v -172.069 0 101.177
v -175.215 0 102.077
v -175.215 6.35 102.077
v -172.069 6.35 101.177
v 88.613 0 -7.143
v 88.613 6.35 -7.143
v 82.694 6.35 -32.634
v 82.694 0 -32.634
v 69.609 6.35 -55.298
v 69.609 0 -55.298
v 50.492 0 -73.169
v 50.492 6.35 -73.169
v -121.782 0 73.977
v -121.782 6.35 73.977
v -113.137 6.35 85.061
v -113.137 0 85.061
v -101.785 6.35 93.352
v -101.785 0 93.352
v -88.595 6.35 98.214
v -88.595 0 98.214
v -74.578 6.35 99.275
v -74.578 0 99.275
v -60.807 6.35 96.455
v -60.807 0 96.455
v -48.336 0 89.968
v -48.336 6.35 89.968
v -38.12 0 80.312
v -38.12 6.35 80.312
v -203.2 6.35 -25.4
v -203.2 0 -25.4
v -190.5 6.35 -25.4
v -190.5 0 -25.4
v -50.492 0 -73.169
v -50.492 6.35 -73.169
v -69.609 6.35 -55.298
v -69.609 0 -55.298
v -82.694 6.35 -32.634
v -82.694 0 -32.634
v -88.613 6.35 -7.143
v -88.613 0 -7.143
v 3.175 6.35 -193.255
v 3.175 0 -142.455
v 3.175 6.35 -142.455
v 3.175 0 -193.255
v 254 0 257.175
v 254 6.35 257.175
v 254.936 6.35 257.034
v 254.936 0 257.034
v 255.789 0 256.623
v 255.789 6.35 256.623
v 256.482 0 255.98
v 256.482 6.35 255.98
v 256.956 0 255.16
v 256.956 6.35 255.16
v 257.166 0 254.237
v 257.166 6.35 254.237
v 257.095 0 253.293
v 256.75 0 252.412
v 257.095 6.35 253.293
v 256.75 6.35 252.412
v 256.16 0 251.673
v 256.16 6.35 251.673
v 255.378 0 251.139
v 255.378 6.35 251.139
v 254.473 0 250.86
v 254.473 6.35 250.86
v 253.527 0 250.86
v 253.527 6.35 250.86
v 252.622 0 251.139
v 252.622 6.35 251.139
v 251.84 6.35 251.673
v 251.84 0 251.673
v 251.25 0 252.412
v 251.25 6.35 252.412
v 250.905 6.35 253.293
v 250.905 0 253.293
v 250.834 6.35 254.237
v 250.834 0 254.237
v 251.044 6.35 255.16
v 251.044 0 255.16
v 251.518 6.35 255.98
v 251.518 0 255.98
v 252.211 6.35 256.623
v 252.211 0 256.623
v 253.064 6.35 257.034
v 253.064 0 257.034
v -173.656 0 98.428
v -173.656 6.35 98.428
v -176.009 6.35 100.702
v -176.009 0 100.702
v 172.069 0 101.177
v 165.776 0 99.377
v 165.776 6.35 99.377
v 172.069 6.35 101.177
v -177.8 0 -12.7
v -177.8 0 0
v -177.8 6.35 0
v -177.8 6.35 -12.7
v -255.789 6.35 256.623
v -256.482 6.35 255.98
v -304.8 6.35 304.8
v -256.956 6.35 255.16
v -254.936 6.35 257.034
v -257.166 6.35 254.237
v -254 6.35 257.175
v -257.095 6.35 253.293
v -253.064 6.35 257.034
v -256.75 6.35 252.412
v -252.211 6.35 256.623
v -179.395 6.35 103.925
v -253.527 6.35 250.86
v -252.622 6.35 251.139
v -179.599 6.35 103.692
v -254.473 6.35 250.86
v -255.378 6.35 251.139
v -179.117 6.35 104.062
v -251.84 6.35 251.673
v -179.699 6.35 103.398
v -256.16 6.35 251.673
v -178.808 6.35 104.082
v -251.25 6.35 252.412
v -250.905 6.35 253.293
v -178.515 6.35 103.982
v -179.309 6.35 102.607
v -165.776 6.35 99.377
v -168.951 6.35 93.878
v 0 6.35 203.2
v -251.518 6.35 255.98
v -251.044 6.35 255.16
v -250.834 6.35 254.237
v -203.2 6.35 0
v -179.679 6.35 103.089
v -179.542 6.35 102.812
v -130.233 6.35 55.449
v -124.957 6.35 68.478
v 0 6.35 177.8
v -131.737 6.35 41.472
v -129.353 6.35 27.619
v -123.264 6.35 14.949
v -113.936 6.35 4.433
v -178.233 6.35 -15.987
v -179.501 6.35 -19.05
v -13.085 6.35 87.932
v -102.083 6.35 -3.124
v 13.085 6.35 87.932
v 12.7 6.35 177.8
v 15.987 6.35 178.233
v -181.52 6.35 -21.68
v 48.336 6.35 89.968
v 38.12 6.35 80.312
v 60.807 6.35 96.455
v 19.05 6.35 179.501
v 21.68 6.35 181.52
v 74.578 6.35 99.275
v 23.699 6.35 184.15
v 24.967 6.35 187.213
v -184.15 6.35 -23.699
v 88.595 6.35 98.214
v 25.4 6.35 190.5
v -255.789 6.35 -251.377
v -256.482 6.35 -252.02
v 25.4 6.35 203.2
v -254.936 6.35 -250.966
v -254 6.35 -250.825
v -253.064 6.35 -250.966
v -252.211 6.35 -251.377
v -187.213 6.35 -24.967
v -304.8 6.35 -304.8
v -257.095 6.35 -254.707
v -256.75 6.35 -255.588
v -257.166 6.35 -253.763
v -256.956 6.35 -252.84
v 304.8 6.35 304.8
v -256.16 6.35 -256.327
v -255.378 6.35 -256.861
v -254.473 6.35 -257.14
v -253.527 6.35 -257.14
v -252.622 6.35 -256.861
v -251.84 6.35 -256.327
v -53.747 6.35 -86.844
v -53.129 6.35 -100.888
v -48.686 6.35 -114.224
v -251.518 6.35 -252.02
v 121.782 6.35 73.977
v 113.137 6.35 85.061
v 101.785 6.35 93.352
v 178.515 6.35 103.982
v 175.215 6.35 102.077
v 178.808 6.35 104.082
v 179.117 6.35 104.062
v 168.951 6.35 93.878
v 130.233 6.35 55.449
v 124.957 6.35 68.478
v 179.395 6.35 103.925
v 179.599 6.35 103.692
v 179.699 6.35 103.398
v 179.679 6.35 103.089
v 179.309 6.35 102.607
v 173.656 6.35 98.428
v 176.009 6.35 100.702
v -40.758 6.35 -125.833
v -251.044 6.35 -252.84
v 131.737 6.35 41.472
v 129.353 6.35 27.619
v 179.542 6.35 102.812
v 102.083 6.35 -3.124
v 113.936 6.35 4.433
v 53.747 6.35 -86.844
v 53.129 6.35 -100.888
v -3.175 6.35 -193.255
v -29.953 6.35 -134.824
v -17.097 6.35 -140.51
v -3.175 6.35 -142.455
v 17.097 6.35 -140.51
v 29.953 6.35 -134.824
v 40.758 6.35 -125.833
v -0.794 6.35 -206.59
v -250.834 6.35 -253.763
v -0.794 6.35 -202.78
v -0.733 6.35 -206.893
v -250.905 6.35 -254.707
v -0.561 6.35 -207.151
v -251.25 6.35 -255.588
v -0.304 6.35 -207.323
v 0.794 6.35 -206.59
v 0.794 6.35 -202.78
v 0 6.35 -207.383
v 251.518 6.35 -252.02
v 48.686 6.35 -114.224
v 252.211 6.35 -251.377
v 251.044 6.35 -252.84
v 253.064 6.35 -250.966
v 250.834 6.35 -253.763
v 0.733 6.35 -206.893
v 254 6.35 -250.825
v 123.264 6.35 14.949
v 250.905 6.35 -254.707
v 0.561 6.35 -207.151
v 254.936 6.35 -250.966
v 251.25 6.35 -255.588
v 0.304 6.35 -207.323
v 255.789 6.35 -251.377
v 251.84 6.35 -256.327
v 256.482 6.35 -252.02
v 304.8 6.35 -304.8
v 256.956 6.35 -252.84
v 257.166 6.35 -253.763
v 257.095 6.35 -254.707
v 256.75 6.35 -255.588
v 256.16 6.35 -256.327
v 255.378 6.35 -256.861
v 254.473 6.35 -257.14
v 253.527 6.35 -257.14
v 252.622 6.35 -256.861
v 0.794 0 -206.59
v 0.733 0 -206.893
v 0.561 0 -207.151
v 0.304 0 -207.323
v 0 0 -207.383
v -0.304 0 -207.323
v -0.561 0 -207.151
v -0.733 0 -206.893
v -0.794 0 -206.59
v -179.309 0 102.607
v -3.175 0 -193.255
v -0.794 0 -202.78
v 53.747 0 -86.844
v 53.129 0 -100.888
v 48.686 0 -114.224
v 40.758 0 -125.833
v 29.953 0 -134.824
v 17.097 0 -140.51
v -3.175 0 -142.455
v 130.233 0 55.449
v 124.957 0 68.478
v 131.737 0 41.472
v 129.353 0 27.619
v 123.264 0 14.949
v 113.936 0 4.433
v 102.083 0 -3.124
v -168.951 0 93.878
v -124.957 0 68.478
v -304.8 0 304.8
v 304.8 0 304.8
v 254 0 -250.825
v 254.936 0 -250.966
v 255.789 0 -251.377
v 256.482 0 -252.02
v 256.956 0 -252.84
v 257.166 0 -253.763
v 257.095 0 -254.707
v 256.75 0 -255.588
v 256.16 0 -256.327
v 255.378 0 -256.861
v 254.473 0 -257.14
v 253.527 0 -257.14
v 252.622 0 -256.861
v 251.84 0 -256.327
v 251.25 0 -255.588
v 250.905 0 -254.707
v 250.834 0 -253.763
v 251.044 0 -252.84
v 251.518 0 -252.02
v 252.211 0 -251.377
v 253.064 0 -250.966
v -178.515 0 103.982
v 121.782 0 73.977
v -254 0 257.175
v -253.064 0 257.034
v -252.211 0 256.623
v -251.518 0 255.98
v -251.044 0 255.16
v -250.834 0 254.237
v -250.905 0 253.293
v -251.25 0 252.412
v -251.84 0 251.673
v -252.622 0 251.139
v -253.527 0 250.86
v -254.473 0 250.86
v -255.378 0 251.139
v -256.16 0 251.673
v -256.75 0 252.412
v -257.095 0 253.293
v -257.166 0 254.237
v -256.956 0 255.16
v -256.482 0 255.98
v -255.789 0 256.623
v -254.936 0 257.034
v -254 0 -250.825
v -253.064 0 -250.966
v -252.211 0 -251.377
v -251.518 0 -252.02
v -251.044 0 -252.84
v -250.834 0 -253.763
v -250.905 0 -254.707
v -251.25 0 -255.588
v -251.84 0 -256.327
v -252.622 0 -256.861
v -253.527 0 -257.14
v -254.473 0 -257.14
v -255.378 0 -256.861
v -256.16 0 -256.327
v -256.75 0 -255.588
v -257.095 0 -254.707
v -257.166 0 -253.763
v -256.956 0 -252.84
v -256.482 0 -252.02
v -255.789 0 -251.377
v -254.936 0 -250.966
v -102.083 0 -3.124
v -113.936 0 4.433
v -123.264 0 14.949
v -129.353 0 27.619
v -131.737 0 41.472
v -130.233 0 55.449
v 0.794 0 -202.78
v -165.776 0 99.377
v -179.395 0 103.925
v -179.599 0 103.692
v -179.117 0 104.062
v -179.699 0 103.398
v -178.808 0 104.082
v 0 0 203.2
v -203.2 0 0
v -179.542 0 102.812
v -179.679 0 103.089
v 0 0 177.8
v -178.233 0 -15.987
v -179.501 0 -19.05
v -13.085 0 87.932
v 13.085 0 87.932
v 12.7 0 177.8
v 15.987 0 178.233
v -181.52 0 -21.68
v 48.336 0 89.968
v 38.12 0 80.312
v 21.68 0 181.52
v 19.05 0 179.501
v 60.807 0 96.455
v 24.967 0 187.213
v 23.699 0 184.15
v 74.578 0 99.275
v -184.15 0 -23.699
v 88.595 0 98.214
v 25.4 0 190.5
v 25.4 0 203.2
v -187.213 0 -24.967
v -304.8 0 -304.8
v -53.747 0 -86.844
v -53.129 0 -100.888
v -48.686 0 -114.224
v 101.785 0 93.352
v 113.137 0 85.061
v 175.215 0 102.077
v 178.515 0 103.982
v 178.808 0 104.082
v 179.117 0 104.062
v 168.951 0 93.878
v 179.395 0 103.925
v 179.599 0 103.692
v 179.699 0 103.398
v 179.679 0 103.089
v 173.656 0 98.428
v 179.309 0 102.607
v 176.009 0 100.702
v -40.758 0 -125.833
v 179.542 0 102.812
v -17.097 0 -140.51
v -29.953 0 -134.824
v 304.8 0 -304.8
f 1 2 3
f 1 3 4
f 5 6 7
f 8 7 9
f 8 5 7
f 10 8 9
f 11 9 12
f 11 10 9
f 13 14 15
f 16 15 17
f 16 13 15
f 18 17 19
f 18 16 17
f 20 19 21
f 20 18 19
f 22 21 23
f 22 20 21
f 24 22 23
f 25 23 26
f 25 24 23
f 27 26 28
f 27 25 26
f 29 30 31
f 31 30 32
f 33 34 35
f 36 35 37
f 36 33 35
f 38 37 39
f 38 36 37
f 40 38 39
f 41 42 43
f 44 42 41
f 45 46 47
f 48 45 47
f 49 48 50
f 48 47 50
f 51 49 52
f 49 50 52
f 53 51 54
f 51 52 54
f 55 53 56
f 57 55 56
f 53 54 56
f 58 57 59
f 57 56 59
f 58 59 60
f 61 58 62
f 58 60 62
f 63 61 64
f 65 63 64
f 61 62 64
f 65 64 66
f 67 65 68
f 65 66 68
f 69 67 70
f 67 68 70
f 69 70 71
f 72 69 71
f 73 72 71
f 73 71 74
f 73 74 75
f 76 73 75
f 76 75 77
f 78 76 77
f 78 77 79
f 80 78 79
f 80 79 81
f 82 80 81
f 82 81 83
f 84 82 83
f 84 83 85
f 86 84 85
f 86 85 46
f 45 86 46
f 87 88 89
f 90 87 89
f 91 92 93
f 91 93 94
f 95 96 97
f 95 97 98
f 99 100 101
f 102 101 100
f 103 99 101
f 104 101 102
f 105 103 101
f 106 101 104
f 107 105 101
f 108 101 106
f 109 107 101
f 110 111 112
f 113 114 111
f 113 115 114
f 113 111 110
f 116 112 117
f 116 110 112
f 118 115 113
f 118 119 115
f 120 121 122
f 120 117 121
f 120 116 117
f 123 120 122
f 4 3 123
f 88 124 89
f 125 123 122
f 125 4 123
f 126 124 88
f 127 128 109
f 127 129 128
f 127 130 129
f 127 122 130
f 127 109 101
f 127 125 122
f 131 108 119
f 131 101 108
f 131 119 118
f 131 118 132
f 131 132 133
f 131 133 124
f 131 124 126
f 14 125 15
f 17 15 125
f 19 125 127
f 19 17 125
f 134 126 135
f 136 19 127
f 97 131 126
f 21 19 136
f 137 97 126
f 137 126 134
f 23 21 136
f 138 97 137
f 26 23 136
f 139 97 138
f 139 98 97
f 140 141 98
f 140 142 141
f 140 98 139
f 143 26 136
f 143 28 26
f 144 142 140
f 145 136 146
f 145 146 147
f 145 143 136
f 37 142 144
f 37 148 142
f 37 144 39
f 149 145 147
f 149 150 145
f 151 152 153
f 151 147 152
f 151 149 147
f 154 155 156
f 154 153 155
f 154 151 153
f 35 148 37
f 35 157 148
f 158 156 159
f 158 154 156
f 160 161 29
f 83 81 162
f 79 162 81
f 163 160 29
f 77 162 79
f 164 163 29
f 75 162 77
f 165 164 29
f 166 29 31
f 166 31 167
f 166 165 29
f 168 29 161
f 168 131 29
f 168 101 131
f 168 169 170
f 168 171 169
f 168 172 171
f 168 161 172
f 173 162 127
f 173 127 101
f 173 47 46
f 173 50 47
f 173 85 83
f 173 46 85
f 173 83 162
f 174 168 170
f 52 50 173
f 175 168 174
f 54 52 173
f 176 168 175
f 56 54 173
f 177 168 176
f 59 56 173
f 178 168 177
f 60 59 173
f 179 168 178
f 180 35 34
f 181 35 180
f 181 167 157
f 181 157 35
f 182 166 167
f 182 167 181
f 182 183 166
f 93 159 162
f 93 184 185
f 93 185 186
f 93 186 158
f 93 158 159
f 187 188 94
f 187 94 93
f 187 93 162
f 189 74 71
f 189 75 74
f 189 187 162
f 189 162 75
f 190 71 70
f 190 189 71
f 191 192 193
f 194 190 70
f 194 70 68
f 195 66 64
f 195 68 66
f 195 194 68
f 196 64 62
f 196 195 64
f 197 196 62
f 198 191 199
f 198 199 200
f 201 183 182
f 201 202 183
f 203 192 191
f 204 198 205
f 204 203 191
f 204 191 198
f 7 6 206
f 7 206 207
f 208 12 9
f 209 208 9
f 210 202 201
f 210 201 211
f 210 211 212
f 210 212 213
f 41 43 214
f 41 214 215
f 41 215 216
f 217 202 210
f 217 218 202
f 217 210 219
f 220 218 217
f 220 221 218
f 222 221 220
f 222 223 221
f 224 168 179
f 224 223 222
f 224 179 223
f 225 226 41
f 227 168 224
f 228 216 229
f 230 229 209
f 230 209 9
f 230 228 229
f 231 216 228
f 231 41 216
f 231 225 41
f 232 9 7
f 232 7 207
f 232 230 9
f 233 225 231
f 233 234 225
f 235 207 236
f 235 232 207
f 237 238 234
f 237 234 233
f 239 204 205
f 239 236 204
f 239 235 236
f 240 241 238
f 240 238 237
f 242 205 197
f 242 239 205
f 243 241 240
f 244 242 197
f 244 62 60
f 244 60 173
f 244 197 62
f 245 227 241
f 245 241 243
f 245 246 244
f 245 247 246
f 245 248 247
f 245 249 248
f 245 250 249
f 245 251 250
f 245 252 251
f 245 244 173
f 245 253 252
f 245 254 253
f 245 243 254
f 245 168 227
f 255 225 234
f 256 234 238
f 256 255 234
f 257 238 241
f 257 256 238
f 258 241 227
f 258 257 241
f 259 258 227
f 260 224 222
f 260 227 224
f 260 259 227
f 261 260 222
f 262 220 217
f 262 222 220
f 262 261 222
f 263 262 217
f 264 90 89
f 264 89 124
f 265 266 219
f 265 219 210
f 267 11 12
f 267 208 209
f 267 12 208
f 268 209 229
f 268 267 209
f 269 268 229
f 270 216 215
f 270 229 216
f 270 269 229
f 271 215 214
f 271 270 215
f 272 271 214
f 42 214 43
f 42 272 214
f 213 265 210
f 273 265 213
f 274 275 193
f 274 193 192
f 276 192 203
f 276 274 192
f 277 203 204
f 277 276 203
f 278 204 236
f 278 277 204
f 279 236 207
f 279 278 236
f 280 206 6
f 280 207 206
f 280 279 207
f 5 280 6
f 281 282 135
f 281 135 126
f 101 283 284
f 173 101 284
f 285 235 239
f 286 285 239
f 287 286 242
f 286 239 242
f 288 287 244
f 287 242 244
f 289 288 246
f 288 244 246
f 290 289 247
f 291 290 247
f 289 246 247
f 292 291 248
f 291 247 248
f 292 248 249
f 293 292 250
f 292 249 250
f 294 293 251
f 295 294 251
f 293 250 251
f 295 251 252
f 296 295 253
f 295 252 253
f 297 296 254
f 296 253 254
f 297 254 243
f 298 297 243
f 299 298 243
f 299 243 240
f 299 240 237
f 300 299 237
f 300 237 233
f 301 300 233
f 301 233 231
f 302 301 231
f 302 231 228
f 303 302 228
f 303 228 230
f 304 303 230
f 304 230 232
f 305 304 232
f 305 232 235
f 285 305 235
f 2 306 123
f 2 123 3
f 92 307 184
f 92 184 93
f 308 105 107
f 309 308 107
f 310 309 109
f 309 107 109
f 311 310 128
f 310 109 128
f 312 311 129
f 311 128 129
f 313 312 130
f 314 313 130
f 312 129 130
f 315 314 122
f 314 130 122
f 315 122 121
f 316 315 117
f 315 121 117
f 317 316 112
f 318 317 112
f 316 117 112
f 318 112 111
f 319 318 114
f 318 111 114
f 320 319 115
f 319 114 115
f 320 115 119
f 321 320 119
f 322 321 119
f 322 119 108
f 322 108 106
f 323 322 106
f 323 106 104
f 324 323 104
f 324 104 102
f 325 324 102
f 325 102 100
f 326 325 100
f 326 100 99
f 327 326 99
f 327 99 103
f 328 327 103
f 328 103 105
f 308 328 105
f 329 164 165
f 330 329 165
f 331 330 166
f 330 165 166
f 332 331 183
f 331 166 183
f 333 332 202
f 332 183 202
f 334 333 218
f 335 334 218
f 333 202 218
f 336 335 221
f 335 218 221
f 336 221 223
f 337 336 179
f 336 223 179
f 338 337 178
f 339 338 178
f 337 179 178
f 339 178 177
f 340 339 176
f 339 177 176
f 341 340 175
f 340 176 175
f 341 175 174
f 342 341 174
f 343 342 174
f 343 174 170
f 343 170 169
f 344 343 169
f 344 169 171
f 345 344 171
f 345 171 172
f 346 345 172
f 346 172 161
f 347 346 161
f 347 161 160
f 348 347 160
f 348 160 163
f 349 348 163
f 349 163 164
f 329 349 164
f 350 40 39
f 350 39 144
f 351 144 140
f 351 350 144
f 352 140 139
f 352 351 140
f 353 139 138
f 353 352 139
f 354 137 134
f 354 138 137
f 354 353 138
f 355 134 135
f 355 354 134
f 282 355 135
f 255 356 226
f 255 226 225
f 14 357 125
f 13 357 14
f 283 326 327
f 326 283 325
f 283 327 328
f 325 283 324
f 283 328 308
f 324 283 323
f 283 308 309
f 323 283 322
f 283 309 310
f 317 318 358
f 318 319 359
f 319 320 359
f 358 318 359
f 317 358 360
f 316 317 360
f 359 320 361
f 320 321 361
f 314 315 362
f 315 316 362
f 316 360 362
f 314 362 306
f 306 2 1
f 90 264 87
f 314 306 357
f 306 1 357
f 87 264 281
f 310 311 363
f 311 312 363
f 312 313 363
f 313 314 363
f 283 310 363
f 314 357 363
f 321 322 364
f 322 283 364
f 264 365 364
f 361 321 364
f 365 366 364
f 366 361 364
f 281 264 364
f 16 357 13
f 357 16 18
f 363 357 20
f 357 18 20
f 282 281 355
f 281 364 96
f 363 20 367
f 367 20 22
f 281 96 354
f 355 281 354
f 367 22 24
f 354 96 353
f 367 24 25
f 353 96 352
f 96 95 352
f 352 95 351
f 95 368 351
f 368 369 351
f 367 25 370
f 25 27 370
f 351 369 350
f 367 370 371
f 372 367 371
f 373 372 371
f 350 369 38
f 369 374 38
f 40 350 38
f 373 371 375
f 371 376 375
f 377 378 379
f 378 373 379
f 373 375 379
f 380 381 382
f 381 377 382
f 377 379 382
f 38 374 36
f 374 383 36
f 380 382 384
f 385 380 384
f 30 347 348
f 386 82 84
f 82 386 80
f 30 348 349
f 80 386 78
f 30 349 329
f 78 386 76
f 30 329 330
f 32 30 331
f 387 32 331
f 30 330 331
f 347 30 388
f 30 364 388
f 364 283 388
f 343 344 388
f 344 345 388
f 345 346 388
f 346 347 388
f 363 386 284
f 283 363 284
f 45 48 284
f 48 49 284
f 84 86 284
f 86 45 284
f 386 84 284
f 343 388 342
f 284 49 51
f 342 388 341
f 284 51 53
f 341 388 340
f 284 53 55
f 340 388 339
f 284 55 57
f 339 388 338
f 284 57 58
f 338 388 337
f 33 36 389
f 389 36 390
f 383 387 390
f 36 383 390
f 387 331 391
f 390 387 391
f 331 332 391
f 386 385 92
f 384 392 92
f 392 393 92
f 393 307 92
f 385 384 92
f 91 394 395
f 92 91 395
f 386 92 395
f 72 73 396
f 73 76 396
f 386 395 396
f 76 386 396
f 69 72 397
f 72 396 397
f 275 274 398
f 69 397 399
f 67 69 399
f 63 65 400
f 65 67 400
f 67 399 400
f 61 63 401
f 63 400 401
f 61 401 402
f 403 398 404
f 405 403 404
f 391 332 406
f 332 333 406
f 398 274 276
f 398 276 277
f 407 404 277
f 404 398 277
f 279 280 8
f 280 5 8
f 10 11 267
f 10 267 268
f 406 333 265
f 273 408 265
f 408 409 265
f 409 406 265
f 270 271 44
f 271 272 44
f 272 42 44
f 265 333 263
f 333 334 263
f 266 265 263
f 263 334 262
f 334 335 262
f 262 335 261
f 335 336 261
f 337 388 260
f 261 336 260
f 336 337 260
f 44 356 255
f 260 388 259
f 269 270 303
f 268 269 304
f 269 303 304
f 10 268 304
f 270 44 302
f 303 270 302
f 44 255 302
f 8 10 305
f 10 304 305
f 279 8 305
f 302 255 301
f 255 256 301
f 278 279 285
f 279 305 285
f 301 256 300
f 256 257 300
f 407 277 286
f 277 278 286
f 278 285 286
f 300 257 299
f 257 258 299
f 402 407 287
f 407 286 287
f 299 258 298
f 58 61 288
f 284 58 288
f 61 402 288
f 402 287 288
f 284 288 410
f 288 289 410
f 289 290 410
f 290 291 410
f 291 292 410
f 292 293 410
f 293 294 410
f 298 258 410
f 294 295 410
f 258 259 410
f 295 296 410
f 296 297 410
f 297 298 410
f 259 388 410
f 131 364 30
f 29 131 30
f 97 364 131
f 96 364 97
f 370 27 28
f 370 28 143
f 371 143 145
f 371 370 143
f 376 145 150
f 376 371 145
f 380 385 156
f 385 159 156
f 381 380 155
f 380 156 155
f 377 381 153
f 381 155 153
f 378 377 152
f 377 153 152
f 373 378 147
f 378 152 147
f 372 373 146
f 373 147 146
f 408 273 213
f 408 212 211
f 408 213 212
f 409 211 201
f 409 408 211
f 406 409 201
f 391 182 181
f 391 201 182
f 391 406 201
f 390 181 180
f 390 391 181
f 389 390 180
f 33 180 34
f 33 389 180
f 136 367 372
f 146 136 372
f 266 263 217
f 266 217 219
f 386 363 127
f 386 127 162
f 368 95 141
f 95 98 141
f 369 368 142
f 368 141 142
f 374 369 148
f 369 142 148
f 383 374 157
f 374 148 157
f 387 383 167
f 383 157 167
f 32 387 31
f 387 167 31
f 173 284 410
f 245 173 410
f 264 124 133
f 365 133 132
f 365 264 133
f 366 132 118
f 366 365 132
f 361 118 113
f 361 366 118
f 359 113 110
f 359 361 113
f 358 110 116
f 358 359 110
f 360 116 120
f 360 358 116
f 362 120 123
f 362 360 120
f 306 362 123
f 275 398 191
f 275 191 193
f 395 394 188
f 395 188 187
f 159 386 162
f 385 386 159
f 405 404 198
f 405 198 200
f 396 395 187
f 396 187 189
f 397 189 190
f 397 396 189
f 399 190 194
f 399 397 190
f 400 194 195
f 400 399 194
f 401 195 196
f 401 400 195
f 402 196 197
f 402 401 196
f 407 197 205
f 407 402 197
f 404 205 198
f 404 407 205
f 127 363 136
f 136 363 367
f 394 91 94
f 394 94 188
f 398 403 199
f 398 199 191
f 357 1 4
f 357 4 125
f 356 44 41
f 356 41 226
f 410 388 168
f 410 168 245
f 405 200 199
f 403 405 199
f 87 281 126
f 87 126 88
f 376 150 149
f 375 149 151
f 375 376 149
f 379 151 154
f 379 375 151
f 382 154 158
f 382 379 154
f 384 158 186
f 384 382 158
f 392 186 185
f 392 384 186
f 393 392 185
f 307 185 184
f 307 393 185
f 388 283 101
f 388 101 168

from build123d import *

# Parameters (mm, degrees)
SKETCH1_W           = 609.6
SKETCH1_H           = 609.6
BOSS_EXTRUDE1_DEPTH = 6.35
CUT_EXTRUDE2_DEPTH  = 432.099063441
SKETCH4_W           = 25.4
SKETCH4_H           = 25.4
CUT_EXTRUDE8_DEPTH  = 432.099063441
FILLET4_R           = 12.7
FILLET5_R           = 12.7
SKETCH5_R           = 3.175
CUT_EXTRUDE9_DEPTH  = 432.099063441


with BuildPart() as part:
    # Sketch1 → Boss-Extrude1 (new body)
    with BuildSketch(Plane(origin=(0, 0, 0), x_dir=(1, 0, 0), z_dir=(0, 1, 0))):
        Rectangle(SKETCH1_W, SKETCH1_H)
    extrude(amount=BOSS_EXTRUDE1_DEPTH)

    # Sketch3 → Cut-Extrude2 (cut, through all)
    with BuildSketch(Plane(origin=(0, 0, 0), x_dir=(1, 0, 0), z_dir=(0, 1, 0))):
        with BuildLine():
            Line((-3.175, 193.254689298), (-3.175, 142.454689298))
            ThreePointArc((-3.175, 142.454689298), (-45.125573361, 120.304111538), (-50.492310608, 73.169232396))
            ThreePointArc((-50.492310608, 73.169232396), (-76.989658396, 44.45), (-88.612569335, 7.143007484))
            ThreePointArc((-88.612569335, 7.143007484), (-126.749203452, -21.072162878), (-124.95687982, -68.477713992))
            Line((-124.95687982, -68.477713992), (-168.950970332, -93.877713992))
            Line((-168.950970332, -93.877713992), (-173.656481646, -98.42752932))
            Line((-173.656481646, -98.42752932), (-176.009237303, -100.702436985))
            Line((-176.009237303, -100.702436985), (-179.308794092, -102.607436985))
            ThreePointArc((-179.308794092, -102.607436985), (-179.599326756, -103.691719649), (-178.515044092, -103.982252313))
            Line((-178.515044092, -103.982252313), (-175.215487303, -102.077252313))
            Line((-175.215487303, -102.077252313), (-172.068981646, -101.177159977))
            Line((-172.068981646, -101.177159977), (-165.775970332, -99.376975306))
            Line((-165.775970332, -99.376975306), (-121.78187982, -73.976975306))
            ThreePointArc((-121.78187982, -73.976975306), (-81.623630091, -99.23194866), (-38.120258727, -80.31223988))
            ThreePointArc((-38.120258727, -80.31223988), (0, -88.9), (38.120258727, -80.31223988))
            ThreePointArc((38.120258727, -80.31223988), (81.623630091, -99.23194866), (121.78187982, -73.976975306))
            Line((121.78187982, -73.976975306), (165.775970332, -99.376975306))
            Line((165.775970332, -99.376975306), (172.068981646, -101.177159977))
            Line((172.068981646, -101.177159977), (175.215487303, -102.077252313))
            Line((175.215487303, -102.077252313), (178.515044092, -103.982252313))
            ThreePointArc((178.515044092, -103.982252313), (179.599326756, -103.691719649), (179.308794092, -102.607436985))
            Line((179.308794092, -102.607436985), (176.009237303, -100.702436985))
            Line((176.009237303, -100.702436985), (173.656481646, -98.42752932))
            Line((173.656481646, -98.42752932), (168.950970332, -93.877713992))
            Line((168.950970332, -93.877713992), (124.95687982, -68.477713992))
            ThreePointArc((124.95687982, -68.477713992), (126.749203452, -21.072162878), (88.612569335, 7.143007484))
            ThreePointArc((88.612569335, 7.143007484), (76.989658396, 44.45), (50.492310608, 73.169232396))
            ThreePointArc((50.492310608, 73.169232396), (45.125573361, 120.304111538), (3.175, 142.454689298))
            Line((3.175, 142.454689298), (3.175, 193.254689298))
            Line((3.175, 193.254689298), (1.5875, 199.604689298))
            Line((1.5875, 199.604689298), (0.79375, 202.779689298))
            Line((0.79375, 202.779689298), (0.79375, 206.589689298))
            ThreePointArc((0.79375, 206.589689298), (0, 207.383439298), (-0.79375, 206.589689298))
            Line((-0.79375, 206.589689298), (-0.79375, 202.779689298))
            Line((-0.79375, 202.779689298), (-1.5875, 199.604689298))
            Line((-1.5875, 199.604689298), (-3.175, 193.254689298))
        make_face()
    extrude(amount=CUT_EXTRUDE2_DEPTH, mode=Mode.SUBTRACT)

    # Sketch4 → Cut-Extrude8 (cut, through all)
    with BuildSketch(Plane(origin=(0, 0, 0), x_dir=(1, 0, 0), z_dir=(0, 1, 0))):
        with Locations((12.7, -190.5)):
            Rectangle(SKETCH4_W, SKETCH4_H)
        with Locations((-190.5, 12.7)):
            Rectangle(SKETCH4_W, SKETCH4_H)
    extrude(amount=CUT_EXTRUDE8_DEPTH, mode=Mode.SUBTRACT)

    # Fillet4
    fillet4_edges = [part.edges().sort_by_distance(p)[0] for p in [
        (-177.8, 3.175, -25.4),
    ]]
    fillet(fillet4_edges, radius=FILLET4_R)

    # Fillet5
    fillet5_edges = [part.edges().sort_by_distance(p)[0] for p in [
        (25.4, 3.175, 177.8),
    ]]
    fillet(fillet5_edges, radius=FILLET5_R)

    # Sketch5 → Cut-Extrude9 (cut, through all)
    with BuildSketch(Plane(origin=(0, 6.35, 0), x_dir=(1, 0, 0), z_dir=(0, 1, 0))):
        with Locations(Location((-254, 254, 0), (0, 0, 270))):
            Circle(SKETCH5_R)
        with Locations(Location((254, 254, 0), (0, 0, 270))):
            Circle(SKETCH5_R)
        with Locations(Location((254, -254, 0), (0, 0, 270))):
            Circle(SKETCH5_R)
        with Locations(Location((-254, -254, 0), (0, 0, 270))):
            Circle(SKETCH5_R)
    extrude(amount=-CUT_EXTRUDE9_DEPTH, mode=Mode.SUBTRACT)


solid = part.part
